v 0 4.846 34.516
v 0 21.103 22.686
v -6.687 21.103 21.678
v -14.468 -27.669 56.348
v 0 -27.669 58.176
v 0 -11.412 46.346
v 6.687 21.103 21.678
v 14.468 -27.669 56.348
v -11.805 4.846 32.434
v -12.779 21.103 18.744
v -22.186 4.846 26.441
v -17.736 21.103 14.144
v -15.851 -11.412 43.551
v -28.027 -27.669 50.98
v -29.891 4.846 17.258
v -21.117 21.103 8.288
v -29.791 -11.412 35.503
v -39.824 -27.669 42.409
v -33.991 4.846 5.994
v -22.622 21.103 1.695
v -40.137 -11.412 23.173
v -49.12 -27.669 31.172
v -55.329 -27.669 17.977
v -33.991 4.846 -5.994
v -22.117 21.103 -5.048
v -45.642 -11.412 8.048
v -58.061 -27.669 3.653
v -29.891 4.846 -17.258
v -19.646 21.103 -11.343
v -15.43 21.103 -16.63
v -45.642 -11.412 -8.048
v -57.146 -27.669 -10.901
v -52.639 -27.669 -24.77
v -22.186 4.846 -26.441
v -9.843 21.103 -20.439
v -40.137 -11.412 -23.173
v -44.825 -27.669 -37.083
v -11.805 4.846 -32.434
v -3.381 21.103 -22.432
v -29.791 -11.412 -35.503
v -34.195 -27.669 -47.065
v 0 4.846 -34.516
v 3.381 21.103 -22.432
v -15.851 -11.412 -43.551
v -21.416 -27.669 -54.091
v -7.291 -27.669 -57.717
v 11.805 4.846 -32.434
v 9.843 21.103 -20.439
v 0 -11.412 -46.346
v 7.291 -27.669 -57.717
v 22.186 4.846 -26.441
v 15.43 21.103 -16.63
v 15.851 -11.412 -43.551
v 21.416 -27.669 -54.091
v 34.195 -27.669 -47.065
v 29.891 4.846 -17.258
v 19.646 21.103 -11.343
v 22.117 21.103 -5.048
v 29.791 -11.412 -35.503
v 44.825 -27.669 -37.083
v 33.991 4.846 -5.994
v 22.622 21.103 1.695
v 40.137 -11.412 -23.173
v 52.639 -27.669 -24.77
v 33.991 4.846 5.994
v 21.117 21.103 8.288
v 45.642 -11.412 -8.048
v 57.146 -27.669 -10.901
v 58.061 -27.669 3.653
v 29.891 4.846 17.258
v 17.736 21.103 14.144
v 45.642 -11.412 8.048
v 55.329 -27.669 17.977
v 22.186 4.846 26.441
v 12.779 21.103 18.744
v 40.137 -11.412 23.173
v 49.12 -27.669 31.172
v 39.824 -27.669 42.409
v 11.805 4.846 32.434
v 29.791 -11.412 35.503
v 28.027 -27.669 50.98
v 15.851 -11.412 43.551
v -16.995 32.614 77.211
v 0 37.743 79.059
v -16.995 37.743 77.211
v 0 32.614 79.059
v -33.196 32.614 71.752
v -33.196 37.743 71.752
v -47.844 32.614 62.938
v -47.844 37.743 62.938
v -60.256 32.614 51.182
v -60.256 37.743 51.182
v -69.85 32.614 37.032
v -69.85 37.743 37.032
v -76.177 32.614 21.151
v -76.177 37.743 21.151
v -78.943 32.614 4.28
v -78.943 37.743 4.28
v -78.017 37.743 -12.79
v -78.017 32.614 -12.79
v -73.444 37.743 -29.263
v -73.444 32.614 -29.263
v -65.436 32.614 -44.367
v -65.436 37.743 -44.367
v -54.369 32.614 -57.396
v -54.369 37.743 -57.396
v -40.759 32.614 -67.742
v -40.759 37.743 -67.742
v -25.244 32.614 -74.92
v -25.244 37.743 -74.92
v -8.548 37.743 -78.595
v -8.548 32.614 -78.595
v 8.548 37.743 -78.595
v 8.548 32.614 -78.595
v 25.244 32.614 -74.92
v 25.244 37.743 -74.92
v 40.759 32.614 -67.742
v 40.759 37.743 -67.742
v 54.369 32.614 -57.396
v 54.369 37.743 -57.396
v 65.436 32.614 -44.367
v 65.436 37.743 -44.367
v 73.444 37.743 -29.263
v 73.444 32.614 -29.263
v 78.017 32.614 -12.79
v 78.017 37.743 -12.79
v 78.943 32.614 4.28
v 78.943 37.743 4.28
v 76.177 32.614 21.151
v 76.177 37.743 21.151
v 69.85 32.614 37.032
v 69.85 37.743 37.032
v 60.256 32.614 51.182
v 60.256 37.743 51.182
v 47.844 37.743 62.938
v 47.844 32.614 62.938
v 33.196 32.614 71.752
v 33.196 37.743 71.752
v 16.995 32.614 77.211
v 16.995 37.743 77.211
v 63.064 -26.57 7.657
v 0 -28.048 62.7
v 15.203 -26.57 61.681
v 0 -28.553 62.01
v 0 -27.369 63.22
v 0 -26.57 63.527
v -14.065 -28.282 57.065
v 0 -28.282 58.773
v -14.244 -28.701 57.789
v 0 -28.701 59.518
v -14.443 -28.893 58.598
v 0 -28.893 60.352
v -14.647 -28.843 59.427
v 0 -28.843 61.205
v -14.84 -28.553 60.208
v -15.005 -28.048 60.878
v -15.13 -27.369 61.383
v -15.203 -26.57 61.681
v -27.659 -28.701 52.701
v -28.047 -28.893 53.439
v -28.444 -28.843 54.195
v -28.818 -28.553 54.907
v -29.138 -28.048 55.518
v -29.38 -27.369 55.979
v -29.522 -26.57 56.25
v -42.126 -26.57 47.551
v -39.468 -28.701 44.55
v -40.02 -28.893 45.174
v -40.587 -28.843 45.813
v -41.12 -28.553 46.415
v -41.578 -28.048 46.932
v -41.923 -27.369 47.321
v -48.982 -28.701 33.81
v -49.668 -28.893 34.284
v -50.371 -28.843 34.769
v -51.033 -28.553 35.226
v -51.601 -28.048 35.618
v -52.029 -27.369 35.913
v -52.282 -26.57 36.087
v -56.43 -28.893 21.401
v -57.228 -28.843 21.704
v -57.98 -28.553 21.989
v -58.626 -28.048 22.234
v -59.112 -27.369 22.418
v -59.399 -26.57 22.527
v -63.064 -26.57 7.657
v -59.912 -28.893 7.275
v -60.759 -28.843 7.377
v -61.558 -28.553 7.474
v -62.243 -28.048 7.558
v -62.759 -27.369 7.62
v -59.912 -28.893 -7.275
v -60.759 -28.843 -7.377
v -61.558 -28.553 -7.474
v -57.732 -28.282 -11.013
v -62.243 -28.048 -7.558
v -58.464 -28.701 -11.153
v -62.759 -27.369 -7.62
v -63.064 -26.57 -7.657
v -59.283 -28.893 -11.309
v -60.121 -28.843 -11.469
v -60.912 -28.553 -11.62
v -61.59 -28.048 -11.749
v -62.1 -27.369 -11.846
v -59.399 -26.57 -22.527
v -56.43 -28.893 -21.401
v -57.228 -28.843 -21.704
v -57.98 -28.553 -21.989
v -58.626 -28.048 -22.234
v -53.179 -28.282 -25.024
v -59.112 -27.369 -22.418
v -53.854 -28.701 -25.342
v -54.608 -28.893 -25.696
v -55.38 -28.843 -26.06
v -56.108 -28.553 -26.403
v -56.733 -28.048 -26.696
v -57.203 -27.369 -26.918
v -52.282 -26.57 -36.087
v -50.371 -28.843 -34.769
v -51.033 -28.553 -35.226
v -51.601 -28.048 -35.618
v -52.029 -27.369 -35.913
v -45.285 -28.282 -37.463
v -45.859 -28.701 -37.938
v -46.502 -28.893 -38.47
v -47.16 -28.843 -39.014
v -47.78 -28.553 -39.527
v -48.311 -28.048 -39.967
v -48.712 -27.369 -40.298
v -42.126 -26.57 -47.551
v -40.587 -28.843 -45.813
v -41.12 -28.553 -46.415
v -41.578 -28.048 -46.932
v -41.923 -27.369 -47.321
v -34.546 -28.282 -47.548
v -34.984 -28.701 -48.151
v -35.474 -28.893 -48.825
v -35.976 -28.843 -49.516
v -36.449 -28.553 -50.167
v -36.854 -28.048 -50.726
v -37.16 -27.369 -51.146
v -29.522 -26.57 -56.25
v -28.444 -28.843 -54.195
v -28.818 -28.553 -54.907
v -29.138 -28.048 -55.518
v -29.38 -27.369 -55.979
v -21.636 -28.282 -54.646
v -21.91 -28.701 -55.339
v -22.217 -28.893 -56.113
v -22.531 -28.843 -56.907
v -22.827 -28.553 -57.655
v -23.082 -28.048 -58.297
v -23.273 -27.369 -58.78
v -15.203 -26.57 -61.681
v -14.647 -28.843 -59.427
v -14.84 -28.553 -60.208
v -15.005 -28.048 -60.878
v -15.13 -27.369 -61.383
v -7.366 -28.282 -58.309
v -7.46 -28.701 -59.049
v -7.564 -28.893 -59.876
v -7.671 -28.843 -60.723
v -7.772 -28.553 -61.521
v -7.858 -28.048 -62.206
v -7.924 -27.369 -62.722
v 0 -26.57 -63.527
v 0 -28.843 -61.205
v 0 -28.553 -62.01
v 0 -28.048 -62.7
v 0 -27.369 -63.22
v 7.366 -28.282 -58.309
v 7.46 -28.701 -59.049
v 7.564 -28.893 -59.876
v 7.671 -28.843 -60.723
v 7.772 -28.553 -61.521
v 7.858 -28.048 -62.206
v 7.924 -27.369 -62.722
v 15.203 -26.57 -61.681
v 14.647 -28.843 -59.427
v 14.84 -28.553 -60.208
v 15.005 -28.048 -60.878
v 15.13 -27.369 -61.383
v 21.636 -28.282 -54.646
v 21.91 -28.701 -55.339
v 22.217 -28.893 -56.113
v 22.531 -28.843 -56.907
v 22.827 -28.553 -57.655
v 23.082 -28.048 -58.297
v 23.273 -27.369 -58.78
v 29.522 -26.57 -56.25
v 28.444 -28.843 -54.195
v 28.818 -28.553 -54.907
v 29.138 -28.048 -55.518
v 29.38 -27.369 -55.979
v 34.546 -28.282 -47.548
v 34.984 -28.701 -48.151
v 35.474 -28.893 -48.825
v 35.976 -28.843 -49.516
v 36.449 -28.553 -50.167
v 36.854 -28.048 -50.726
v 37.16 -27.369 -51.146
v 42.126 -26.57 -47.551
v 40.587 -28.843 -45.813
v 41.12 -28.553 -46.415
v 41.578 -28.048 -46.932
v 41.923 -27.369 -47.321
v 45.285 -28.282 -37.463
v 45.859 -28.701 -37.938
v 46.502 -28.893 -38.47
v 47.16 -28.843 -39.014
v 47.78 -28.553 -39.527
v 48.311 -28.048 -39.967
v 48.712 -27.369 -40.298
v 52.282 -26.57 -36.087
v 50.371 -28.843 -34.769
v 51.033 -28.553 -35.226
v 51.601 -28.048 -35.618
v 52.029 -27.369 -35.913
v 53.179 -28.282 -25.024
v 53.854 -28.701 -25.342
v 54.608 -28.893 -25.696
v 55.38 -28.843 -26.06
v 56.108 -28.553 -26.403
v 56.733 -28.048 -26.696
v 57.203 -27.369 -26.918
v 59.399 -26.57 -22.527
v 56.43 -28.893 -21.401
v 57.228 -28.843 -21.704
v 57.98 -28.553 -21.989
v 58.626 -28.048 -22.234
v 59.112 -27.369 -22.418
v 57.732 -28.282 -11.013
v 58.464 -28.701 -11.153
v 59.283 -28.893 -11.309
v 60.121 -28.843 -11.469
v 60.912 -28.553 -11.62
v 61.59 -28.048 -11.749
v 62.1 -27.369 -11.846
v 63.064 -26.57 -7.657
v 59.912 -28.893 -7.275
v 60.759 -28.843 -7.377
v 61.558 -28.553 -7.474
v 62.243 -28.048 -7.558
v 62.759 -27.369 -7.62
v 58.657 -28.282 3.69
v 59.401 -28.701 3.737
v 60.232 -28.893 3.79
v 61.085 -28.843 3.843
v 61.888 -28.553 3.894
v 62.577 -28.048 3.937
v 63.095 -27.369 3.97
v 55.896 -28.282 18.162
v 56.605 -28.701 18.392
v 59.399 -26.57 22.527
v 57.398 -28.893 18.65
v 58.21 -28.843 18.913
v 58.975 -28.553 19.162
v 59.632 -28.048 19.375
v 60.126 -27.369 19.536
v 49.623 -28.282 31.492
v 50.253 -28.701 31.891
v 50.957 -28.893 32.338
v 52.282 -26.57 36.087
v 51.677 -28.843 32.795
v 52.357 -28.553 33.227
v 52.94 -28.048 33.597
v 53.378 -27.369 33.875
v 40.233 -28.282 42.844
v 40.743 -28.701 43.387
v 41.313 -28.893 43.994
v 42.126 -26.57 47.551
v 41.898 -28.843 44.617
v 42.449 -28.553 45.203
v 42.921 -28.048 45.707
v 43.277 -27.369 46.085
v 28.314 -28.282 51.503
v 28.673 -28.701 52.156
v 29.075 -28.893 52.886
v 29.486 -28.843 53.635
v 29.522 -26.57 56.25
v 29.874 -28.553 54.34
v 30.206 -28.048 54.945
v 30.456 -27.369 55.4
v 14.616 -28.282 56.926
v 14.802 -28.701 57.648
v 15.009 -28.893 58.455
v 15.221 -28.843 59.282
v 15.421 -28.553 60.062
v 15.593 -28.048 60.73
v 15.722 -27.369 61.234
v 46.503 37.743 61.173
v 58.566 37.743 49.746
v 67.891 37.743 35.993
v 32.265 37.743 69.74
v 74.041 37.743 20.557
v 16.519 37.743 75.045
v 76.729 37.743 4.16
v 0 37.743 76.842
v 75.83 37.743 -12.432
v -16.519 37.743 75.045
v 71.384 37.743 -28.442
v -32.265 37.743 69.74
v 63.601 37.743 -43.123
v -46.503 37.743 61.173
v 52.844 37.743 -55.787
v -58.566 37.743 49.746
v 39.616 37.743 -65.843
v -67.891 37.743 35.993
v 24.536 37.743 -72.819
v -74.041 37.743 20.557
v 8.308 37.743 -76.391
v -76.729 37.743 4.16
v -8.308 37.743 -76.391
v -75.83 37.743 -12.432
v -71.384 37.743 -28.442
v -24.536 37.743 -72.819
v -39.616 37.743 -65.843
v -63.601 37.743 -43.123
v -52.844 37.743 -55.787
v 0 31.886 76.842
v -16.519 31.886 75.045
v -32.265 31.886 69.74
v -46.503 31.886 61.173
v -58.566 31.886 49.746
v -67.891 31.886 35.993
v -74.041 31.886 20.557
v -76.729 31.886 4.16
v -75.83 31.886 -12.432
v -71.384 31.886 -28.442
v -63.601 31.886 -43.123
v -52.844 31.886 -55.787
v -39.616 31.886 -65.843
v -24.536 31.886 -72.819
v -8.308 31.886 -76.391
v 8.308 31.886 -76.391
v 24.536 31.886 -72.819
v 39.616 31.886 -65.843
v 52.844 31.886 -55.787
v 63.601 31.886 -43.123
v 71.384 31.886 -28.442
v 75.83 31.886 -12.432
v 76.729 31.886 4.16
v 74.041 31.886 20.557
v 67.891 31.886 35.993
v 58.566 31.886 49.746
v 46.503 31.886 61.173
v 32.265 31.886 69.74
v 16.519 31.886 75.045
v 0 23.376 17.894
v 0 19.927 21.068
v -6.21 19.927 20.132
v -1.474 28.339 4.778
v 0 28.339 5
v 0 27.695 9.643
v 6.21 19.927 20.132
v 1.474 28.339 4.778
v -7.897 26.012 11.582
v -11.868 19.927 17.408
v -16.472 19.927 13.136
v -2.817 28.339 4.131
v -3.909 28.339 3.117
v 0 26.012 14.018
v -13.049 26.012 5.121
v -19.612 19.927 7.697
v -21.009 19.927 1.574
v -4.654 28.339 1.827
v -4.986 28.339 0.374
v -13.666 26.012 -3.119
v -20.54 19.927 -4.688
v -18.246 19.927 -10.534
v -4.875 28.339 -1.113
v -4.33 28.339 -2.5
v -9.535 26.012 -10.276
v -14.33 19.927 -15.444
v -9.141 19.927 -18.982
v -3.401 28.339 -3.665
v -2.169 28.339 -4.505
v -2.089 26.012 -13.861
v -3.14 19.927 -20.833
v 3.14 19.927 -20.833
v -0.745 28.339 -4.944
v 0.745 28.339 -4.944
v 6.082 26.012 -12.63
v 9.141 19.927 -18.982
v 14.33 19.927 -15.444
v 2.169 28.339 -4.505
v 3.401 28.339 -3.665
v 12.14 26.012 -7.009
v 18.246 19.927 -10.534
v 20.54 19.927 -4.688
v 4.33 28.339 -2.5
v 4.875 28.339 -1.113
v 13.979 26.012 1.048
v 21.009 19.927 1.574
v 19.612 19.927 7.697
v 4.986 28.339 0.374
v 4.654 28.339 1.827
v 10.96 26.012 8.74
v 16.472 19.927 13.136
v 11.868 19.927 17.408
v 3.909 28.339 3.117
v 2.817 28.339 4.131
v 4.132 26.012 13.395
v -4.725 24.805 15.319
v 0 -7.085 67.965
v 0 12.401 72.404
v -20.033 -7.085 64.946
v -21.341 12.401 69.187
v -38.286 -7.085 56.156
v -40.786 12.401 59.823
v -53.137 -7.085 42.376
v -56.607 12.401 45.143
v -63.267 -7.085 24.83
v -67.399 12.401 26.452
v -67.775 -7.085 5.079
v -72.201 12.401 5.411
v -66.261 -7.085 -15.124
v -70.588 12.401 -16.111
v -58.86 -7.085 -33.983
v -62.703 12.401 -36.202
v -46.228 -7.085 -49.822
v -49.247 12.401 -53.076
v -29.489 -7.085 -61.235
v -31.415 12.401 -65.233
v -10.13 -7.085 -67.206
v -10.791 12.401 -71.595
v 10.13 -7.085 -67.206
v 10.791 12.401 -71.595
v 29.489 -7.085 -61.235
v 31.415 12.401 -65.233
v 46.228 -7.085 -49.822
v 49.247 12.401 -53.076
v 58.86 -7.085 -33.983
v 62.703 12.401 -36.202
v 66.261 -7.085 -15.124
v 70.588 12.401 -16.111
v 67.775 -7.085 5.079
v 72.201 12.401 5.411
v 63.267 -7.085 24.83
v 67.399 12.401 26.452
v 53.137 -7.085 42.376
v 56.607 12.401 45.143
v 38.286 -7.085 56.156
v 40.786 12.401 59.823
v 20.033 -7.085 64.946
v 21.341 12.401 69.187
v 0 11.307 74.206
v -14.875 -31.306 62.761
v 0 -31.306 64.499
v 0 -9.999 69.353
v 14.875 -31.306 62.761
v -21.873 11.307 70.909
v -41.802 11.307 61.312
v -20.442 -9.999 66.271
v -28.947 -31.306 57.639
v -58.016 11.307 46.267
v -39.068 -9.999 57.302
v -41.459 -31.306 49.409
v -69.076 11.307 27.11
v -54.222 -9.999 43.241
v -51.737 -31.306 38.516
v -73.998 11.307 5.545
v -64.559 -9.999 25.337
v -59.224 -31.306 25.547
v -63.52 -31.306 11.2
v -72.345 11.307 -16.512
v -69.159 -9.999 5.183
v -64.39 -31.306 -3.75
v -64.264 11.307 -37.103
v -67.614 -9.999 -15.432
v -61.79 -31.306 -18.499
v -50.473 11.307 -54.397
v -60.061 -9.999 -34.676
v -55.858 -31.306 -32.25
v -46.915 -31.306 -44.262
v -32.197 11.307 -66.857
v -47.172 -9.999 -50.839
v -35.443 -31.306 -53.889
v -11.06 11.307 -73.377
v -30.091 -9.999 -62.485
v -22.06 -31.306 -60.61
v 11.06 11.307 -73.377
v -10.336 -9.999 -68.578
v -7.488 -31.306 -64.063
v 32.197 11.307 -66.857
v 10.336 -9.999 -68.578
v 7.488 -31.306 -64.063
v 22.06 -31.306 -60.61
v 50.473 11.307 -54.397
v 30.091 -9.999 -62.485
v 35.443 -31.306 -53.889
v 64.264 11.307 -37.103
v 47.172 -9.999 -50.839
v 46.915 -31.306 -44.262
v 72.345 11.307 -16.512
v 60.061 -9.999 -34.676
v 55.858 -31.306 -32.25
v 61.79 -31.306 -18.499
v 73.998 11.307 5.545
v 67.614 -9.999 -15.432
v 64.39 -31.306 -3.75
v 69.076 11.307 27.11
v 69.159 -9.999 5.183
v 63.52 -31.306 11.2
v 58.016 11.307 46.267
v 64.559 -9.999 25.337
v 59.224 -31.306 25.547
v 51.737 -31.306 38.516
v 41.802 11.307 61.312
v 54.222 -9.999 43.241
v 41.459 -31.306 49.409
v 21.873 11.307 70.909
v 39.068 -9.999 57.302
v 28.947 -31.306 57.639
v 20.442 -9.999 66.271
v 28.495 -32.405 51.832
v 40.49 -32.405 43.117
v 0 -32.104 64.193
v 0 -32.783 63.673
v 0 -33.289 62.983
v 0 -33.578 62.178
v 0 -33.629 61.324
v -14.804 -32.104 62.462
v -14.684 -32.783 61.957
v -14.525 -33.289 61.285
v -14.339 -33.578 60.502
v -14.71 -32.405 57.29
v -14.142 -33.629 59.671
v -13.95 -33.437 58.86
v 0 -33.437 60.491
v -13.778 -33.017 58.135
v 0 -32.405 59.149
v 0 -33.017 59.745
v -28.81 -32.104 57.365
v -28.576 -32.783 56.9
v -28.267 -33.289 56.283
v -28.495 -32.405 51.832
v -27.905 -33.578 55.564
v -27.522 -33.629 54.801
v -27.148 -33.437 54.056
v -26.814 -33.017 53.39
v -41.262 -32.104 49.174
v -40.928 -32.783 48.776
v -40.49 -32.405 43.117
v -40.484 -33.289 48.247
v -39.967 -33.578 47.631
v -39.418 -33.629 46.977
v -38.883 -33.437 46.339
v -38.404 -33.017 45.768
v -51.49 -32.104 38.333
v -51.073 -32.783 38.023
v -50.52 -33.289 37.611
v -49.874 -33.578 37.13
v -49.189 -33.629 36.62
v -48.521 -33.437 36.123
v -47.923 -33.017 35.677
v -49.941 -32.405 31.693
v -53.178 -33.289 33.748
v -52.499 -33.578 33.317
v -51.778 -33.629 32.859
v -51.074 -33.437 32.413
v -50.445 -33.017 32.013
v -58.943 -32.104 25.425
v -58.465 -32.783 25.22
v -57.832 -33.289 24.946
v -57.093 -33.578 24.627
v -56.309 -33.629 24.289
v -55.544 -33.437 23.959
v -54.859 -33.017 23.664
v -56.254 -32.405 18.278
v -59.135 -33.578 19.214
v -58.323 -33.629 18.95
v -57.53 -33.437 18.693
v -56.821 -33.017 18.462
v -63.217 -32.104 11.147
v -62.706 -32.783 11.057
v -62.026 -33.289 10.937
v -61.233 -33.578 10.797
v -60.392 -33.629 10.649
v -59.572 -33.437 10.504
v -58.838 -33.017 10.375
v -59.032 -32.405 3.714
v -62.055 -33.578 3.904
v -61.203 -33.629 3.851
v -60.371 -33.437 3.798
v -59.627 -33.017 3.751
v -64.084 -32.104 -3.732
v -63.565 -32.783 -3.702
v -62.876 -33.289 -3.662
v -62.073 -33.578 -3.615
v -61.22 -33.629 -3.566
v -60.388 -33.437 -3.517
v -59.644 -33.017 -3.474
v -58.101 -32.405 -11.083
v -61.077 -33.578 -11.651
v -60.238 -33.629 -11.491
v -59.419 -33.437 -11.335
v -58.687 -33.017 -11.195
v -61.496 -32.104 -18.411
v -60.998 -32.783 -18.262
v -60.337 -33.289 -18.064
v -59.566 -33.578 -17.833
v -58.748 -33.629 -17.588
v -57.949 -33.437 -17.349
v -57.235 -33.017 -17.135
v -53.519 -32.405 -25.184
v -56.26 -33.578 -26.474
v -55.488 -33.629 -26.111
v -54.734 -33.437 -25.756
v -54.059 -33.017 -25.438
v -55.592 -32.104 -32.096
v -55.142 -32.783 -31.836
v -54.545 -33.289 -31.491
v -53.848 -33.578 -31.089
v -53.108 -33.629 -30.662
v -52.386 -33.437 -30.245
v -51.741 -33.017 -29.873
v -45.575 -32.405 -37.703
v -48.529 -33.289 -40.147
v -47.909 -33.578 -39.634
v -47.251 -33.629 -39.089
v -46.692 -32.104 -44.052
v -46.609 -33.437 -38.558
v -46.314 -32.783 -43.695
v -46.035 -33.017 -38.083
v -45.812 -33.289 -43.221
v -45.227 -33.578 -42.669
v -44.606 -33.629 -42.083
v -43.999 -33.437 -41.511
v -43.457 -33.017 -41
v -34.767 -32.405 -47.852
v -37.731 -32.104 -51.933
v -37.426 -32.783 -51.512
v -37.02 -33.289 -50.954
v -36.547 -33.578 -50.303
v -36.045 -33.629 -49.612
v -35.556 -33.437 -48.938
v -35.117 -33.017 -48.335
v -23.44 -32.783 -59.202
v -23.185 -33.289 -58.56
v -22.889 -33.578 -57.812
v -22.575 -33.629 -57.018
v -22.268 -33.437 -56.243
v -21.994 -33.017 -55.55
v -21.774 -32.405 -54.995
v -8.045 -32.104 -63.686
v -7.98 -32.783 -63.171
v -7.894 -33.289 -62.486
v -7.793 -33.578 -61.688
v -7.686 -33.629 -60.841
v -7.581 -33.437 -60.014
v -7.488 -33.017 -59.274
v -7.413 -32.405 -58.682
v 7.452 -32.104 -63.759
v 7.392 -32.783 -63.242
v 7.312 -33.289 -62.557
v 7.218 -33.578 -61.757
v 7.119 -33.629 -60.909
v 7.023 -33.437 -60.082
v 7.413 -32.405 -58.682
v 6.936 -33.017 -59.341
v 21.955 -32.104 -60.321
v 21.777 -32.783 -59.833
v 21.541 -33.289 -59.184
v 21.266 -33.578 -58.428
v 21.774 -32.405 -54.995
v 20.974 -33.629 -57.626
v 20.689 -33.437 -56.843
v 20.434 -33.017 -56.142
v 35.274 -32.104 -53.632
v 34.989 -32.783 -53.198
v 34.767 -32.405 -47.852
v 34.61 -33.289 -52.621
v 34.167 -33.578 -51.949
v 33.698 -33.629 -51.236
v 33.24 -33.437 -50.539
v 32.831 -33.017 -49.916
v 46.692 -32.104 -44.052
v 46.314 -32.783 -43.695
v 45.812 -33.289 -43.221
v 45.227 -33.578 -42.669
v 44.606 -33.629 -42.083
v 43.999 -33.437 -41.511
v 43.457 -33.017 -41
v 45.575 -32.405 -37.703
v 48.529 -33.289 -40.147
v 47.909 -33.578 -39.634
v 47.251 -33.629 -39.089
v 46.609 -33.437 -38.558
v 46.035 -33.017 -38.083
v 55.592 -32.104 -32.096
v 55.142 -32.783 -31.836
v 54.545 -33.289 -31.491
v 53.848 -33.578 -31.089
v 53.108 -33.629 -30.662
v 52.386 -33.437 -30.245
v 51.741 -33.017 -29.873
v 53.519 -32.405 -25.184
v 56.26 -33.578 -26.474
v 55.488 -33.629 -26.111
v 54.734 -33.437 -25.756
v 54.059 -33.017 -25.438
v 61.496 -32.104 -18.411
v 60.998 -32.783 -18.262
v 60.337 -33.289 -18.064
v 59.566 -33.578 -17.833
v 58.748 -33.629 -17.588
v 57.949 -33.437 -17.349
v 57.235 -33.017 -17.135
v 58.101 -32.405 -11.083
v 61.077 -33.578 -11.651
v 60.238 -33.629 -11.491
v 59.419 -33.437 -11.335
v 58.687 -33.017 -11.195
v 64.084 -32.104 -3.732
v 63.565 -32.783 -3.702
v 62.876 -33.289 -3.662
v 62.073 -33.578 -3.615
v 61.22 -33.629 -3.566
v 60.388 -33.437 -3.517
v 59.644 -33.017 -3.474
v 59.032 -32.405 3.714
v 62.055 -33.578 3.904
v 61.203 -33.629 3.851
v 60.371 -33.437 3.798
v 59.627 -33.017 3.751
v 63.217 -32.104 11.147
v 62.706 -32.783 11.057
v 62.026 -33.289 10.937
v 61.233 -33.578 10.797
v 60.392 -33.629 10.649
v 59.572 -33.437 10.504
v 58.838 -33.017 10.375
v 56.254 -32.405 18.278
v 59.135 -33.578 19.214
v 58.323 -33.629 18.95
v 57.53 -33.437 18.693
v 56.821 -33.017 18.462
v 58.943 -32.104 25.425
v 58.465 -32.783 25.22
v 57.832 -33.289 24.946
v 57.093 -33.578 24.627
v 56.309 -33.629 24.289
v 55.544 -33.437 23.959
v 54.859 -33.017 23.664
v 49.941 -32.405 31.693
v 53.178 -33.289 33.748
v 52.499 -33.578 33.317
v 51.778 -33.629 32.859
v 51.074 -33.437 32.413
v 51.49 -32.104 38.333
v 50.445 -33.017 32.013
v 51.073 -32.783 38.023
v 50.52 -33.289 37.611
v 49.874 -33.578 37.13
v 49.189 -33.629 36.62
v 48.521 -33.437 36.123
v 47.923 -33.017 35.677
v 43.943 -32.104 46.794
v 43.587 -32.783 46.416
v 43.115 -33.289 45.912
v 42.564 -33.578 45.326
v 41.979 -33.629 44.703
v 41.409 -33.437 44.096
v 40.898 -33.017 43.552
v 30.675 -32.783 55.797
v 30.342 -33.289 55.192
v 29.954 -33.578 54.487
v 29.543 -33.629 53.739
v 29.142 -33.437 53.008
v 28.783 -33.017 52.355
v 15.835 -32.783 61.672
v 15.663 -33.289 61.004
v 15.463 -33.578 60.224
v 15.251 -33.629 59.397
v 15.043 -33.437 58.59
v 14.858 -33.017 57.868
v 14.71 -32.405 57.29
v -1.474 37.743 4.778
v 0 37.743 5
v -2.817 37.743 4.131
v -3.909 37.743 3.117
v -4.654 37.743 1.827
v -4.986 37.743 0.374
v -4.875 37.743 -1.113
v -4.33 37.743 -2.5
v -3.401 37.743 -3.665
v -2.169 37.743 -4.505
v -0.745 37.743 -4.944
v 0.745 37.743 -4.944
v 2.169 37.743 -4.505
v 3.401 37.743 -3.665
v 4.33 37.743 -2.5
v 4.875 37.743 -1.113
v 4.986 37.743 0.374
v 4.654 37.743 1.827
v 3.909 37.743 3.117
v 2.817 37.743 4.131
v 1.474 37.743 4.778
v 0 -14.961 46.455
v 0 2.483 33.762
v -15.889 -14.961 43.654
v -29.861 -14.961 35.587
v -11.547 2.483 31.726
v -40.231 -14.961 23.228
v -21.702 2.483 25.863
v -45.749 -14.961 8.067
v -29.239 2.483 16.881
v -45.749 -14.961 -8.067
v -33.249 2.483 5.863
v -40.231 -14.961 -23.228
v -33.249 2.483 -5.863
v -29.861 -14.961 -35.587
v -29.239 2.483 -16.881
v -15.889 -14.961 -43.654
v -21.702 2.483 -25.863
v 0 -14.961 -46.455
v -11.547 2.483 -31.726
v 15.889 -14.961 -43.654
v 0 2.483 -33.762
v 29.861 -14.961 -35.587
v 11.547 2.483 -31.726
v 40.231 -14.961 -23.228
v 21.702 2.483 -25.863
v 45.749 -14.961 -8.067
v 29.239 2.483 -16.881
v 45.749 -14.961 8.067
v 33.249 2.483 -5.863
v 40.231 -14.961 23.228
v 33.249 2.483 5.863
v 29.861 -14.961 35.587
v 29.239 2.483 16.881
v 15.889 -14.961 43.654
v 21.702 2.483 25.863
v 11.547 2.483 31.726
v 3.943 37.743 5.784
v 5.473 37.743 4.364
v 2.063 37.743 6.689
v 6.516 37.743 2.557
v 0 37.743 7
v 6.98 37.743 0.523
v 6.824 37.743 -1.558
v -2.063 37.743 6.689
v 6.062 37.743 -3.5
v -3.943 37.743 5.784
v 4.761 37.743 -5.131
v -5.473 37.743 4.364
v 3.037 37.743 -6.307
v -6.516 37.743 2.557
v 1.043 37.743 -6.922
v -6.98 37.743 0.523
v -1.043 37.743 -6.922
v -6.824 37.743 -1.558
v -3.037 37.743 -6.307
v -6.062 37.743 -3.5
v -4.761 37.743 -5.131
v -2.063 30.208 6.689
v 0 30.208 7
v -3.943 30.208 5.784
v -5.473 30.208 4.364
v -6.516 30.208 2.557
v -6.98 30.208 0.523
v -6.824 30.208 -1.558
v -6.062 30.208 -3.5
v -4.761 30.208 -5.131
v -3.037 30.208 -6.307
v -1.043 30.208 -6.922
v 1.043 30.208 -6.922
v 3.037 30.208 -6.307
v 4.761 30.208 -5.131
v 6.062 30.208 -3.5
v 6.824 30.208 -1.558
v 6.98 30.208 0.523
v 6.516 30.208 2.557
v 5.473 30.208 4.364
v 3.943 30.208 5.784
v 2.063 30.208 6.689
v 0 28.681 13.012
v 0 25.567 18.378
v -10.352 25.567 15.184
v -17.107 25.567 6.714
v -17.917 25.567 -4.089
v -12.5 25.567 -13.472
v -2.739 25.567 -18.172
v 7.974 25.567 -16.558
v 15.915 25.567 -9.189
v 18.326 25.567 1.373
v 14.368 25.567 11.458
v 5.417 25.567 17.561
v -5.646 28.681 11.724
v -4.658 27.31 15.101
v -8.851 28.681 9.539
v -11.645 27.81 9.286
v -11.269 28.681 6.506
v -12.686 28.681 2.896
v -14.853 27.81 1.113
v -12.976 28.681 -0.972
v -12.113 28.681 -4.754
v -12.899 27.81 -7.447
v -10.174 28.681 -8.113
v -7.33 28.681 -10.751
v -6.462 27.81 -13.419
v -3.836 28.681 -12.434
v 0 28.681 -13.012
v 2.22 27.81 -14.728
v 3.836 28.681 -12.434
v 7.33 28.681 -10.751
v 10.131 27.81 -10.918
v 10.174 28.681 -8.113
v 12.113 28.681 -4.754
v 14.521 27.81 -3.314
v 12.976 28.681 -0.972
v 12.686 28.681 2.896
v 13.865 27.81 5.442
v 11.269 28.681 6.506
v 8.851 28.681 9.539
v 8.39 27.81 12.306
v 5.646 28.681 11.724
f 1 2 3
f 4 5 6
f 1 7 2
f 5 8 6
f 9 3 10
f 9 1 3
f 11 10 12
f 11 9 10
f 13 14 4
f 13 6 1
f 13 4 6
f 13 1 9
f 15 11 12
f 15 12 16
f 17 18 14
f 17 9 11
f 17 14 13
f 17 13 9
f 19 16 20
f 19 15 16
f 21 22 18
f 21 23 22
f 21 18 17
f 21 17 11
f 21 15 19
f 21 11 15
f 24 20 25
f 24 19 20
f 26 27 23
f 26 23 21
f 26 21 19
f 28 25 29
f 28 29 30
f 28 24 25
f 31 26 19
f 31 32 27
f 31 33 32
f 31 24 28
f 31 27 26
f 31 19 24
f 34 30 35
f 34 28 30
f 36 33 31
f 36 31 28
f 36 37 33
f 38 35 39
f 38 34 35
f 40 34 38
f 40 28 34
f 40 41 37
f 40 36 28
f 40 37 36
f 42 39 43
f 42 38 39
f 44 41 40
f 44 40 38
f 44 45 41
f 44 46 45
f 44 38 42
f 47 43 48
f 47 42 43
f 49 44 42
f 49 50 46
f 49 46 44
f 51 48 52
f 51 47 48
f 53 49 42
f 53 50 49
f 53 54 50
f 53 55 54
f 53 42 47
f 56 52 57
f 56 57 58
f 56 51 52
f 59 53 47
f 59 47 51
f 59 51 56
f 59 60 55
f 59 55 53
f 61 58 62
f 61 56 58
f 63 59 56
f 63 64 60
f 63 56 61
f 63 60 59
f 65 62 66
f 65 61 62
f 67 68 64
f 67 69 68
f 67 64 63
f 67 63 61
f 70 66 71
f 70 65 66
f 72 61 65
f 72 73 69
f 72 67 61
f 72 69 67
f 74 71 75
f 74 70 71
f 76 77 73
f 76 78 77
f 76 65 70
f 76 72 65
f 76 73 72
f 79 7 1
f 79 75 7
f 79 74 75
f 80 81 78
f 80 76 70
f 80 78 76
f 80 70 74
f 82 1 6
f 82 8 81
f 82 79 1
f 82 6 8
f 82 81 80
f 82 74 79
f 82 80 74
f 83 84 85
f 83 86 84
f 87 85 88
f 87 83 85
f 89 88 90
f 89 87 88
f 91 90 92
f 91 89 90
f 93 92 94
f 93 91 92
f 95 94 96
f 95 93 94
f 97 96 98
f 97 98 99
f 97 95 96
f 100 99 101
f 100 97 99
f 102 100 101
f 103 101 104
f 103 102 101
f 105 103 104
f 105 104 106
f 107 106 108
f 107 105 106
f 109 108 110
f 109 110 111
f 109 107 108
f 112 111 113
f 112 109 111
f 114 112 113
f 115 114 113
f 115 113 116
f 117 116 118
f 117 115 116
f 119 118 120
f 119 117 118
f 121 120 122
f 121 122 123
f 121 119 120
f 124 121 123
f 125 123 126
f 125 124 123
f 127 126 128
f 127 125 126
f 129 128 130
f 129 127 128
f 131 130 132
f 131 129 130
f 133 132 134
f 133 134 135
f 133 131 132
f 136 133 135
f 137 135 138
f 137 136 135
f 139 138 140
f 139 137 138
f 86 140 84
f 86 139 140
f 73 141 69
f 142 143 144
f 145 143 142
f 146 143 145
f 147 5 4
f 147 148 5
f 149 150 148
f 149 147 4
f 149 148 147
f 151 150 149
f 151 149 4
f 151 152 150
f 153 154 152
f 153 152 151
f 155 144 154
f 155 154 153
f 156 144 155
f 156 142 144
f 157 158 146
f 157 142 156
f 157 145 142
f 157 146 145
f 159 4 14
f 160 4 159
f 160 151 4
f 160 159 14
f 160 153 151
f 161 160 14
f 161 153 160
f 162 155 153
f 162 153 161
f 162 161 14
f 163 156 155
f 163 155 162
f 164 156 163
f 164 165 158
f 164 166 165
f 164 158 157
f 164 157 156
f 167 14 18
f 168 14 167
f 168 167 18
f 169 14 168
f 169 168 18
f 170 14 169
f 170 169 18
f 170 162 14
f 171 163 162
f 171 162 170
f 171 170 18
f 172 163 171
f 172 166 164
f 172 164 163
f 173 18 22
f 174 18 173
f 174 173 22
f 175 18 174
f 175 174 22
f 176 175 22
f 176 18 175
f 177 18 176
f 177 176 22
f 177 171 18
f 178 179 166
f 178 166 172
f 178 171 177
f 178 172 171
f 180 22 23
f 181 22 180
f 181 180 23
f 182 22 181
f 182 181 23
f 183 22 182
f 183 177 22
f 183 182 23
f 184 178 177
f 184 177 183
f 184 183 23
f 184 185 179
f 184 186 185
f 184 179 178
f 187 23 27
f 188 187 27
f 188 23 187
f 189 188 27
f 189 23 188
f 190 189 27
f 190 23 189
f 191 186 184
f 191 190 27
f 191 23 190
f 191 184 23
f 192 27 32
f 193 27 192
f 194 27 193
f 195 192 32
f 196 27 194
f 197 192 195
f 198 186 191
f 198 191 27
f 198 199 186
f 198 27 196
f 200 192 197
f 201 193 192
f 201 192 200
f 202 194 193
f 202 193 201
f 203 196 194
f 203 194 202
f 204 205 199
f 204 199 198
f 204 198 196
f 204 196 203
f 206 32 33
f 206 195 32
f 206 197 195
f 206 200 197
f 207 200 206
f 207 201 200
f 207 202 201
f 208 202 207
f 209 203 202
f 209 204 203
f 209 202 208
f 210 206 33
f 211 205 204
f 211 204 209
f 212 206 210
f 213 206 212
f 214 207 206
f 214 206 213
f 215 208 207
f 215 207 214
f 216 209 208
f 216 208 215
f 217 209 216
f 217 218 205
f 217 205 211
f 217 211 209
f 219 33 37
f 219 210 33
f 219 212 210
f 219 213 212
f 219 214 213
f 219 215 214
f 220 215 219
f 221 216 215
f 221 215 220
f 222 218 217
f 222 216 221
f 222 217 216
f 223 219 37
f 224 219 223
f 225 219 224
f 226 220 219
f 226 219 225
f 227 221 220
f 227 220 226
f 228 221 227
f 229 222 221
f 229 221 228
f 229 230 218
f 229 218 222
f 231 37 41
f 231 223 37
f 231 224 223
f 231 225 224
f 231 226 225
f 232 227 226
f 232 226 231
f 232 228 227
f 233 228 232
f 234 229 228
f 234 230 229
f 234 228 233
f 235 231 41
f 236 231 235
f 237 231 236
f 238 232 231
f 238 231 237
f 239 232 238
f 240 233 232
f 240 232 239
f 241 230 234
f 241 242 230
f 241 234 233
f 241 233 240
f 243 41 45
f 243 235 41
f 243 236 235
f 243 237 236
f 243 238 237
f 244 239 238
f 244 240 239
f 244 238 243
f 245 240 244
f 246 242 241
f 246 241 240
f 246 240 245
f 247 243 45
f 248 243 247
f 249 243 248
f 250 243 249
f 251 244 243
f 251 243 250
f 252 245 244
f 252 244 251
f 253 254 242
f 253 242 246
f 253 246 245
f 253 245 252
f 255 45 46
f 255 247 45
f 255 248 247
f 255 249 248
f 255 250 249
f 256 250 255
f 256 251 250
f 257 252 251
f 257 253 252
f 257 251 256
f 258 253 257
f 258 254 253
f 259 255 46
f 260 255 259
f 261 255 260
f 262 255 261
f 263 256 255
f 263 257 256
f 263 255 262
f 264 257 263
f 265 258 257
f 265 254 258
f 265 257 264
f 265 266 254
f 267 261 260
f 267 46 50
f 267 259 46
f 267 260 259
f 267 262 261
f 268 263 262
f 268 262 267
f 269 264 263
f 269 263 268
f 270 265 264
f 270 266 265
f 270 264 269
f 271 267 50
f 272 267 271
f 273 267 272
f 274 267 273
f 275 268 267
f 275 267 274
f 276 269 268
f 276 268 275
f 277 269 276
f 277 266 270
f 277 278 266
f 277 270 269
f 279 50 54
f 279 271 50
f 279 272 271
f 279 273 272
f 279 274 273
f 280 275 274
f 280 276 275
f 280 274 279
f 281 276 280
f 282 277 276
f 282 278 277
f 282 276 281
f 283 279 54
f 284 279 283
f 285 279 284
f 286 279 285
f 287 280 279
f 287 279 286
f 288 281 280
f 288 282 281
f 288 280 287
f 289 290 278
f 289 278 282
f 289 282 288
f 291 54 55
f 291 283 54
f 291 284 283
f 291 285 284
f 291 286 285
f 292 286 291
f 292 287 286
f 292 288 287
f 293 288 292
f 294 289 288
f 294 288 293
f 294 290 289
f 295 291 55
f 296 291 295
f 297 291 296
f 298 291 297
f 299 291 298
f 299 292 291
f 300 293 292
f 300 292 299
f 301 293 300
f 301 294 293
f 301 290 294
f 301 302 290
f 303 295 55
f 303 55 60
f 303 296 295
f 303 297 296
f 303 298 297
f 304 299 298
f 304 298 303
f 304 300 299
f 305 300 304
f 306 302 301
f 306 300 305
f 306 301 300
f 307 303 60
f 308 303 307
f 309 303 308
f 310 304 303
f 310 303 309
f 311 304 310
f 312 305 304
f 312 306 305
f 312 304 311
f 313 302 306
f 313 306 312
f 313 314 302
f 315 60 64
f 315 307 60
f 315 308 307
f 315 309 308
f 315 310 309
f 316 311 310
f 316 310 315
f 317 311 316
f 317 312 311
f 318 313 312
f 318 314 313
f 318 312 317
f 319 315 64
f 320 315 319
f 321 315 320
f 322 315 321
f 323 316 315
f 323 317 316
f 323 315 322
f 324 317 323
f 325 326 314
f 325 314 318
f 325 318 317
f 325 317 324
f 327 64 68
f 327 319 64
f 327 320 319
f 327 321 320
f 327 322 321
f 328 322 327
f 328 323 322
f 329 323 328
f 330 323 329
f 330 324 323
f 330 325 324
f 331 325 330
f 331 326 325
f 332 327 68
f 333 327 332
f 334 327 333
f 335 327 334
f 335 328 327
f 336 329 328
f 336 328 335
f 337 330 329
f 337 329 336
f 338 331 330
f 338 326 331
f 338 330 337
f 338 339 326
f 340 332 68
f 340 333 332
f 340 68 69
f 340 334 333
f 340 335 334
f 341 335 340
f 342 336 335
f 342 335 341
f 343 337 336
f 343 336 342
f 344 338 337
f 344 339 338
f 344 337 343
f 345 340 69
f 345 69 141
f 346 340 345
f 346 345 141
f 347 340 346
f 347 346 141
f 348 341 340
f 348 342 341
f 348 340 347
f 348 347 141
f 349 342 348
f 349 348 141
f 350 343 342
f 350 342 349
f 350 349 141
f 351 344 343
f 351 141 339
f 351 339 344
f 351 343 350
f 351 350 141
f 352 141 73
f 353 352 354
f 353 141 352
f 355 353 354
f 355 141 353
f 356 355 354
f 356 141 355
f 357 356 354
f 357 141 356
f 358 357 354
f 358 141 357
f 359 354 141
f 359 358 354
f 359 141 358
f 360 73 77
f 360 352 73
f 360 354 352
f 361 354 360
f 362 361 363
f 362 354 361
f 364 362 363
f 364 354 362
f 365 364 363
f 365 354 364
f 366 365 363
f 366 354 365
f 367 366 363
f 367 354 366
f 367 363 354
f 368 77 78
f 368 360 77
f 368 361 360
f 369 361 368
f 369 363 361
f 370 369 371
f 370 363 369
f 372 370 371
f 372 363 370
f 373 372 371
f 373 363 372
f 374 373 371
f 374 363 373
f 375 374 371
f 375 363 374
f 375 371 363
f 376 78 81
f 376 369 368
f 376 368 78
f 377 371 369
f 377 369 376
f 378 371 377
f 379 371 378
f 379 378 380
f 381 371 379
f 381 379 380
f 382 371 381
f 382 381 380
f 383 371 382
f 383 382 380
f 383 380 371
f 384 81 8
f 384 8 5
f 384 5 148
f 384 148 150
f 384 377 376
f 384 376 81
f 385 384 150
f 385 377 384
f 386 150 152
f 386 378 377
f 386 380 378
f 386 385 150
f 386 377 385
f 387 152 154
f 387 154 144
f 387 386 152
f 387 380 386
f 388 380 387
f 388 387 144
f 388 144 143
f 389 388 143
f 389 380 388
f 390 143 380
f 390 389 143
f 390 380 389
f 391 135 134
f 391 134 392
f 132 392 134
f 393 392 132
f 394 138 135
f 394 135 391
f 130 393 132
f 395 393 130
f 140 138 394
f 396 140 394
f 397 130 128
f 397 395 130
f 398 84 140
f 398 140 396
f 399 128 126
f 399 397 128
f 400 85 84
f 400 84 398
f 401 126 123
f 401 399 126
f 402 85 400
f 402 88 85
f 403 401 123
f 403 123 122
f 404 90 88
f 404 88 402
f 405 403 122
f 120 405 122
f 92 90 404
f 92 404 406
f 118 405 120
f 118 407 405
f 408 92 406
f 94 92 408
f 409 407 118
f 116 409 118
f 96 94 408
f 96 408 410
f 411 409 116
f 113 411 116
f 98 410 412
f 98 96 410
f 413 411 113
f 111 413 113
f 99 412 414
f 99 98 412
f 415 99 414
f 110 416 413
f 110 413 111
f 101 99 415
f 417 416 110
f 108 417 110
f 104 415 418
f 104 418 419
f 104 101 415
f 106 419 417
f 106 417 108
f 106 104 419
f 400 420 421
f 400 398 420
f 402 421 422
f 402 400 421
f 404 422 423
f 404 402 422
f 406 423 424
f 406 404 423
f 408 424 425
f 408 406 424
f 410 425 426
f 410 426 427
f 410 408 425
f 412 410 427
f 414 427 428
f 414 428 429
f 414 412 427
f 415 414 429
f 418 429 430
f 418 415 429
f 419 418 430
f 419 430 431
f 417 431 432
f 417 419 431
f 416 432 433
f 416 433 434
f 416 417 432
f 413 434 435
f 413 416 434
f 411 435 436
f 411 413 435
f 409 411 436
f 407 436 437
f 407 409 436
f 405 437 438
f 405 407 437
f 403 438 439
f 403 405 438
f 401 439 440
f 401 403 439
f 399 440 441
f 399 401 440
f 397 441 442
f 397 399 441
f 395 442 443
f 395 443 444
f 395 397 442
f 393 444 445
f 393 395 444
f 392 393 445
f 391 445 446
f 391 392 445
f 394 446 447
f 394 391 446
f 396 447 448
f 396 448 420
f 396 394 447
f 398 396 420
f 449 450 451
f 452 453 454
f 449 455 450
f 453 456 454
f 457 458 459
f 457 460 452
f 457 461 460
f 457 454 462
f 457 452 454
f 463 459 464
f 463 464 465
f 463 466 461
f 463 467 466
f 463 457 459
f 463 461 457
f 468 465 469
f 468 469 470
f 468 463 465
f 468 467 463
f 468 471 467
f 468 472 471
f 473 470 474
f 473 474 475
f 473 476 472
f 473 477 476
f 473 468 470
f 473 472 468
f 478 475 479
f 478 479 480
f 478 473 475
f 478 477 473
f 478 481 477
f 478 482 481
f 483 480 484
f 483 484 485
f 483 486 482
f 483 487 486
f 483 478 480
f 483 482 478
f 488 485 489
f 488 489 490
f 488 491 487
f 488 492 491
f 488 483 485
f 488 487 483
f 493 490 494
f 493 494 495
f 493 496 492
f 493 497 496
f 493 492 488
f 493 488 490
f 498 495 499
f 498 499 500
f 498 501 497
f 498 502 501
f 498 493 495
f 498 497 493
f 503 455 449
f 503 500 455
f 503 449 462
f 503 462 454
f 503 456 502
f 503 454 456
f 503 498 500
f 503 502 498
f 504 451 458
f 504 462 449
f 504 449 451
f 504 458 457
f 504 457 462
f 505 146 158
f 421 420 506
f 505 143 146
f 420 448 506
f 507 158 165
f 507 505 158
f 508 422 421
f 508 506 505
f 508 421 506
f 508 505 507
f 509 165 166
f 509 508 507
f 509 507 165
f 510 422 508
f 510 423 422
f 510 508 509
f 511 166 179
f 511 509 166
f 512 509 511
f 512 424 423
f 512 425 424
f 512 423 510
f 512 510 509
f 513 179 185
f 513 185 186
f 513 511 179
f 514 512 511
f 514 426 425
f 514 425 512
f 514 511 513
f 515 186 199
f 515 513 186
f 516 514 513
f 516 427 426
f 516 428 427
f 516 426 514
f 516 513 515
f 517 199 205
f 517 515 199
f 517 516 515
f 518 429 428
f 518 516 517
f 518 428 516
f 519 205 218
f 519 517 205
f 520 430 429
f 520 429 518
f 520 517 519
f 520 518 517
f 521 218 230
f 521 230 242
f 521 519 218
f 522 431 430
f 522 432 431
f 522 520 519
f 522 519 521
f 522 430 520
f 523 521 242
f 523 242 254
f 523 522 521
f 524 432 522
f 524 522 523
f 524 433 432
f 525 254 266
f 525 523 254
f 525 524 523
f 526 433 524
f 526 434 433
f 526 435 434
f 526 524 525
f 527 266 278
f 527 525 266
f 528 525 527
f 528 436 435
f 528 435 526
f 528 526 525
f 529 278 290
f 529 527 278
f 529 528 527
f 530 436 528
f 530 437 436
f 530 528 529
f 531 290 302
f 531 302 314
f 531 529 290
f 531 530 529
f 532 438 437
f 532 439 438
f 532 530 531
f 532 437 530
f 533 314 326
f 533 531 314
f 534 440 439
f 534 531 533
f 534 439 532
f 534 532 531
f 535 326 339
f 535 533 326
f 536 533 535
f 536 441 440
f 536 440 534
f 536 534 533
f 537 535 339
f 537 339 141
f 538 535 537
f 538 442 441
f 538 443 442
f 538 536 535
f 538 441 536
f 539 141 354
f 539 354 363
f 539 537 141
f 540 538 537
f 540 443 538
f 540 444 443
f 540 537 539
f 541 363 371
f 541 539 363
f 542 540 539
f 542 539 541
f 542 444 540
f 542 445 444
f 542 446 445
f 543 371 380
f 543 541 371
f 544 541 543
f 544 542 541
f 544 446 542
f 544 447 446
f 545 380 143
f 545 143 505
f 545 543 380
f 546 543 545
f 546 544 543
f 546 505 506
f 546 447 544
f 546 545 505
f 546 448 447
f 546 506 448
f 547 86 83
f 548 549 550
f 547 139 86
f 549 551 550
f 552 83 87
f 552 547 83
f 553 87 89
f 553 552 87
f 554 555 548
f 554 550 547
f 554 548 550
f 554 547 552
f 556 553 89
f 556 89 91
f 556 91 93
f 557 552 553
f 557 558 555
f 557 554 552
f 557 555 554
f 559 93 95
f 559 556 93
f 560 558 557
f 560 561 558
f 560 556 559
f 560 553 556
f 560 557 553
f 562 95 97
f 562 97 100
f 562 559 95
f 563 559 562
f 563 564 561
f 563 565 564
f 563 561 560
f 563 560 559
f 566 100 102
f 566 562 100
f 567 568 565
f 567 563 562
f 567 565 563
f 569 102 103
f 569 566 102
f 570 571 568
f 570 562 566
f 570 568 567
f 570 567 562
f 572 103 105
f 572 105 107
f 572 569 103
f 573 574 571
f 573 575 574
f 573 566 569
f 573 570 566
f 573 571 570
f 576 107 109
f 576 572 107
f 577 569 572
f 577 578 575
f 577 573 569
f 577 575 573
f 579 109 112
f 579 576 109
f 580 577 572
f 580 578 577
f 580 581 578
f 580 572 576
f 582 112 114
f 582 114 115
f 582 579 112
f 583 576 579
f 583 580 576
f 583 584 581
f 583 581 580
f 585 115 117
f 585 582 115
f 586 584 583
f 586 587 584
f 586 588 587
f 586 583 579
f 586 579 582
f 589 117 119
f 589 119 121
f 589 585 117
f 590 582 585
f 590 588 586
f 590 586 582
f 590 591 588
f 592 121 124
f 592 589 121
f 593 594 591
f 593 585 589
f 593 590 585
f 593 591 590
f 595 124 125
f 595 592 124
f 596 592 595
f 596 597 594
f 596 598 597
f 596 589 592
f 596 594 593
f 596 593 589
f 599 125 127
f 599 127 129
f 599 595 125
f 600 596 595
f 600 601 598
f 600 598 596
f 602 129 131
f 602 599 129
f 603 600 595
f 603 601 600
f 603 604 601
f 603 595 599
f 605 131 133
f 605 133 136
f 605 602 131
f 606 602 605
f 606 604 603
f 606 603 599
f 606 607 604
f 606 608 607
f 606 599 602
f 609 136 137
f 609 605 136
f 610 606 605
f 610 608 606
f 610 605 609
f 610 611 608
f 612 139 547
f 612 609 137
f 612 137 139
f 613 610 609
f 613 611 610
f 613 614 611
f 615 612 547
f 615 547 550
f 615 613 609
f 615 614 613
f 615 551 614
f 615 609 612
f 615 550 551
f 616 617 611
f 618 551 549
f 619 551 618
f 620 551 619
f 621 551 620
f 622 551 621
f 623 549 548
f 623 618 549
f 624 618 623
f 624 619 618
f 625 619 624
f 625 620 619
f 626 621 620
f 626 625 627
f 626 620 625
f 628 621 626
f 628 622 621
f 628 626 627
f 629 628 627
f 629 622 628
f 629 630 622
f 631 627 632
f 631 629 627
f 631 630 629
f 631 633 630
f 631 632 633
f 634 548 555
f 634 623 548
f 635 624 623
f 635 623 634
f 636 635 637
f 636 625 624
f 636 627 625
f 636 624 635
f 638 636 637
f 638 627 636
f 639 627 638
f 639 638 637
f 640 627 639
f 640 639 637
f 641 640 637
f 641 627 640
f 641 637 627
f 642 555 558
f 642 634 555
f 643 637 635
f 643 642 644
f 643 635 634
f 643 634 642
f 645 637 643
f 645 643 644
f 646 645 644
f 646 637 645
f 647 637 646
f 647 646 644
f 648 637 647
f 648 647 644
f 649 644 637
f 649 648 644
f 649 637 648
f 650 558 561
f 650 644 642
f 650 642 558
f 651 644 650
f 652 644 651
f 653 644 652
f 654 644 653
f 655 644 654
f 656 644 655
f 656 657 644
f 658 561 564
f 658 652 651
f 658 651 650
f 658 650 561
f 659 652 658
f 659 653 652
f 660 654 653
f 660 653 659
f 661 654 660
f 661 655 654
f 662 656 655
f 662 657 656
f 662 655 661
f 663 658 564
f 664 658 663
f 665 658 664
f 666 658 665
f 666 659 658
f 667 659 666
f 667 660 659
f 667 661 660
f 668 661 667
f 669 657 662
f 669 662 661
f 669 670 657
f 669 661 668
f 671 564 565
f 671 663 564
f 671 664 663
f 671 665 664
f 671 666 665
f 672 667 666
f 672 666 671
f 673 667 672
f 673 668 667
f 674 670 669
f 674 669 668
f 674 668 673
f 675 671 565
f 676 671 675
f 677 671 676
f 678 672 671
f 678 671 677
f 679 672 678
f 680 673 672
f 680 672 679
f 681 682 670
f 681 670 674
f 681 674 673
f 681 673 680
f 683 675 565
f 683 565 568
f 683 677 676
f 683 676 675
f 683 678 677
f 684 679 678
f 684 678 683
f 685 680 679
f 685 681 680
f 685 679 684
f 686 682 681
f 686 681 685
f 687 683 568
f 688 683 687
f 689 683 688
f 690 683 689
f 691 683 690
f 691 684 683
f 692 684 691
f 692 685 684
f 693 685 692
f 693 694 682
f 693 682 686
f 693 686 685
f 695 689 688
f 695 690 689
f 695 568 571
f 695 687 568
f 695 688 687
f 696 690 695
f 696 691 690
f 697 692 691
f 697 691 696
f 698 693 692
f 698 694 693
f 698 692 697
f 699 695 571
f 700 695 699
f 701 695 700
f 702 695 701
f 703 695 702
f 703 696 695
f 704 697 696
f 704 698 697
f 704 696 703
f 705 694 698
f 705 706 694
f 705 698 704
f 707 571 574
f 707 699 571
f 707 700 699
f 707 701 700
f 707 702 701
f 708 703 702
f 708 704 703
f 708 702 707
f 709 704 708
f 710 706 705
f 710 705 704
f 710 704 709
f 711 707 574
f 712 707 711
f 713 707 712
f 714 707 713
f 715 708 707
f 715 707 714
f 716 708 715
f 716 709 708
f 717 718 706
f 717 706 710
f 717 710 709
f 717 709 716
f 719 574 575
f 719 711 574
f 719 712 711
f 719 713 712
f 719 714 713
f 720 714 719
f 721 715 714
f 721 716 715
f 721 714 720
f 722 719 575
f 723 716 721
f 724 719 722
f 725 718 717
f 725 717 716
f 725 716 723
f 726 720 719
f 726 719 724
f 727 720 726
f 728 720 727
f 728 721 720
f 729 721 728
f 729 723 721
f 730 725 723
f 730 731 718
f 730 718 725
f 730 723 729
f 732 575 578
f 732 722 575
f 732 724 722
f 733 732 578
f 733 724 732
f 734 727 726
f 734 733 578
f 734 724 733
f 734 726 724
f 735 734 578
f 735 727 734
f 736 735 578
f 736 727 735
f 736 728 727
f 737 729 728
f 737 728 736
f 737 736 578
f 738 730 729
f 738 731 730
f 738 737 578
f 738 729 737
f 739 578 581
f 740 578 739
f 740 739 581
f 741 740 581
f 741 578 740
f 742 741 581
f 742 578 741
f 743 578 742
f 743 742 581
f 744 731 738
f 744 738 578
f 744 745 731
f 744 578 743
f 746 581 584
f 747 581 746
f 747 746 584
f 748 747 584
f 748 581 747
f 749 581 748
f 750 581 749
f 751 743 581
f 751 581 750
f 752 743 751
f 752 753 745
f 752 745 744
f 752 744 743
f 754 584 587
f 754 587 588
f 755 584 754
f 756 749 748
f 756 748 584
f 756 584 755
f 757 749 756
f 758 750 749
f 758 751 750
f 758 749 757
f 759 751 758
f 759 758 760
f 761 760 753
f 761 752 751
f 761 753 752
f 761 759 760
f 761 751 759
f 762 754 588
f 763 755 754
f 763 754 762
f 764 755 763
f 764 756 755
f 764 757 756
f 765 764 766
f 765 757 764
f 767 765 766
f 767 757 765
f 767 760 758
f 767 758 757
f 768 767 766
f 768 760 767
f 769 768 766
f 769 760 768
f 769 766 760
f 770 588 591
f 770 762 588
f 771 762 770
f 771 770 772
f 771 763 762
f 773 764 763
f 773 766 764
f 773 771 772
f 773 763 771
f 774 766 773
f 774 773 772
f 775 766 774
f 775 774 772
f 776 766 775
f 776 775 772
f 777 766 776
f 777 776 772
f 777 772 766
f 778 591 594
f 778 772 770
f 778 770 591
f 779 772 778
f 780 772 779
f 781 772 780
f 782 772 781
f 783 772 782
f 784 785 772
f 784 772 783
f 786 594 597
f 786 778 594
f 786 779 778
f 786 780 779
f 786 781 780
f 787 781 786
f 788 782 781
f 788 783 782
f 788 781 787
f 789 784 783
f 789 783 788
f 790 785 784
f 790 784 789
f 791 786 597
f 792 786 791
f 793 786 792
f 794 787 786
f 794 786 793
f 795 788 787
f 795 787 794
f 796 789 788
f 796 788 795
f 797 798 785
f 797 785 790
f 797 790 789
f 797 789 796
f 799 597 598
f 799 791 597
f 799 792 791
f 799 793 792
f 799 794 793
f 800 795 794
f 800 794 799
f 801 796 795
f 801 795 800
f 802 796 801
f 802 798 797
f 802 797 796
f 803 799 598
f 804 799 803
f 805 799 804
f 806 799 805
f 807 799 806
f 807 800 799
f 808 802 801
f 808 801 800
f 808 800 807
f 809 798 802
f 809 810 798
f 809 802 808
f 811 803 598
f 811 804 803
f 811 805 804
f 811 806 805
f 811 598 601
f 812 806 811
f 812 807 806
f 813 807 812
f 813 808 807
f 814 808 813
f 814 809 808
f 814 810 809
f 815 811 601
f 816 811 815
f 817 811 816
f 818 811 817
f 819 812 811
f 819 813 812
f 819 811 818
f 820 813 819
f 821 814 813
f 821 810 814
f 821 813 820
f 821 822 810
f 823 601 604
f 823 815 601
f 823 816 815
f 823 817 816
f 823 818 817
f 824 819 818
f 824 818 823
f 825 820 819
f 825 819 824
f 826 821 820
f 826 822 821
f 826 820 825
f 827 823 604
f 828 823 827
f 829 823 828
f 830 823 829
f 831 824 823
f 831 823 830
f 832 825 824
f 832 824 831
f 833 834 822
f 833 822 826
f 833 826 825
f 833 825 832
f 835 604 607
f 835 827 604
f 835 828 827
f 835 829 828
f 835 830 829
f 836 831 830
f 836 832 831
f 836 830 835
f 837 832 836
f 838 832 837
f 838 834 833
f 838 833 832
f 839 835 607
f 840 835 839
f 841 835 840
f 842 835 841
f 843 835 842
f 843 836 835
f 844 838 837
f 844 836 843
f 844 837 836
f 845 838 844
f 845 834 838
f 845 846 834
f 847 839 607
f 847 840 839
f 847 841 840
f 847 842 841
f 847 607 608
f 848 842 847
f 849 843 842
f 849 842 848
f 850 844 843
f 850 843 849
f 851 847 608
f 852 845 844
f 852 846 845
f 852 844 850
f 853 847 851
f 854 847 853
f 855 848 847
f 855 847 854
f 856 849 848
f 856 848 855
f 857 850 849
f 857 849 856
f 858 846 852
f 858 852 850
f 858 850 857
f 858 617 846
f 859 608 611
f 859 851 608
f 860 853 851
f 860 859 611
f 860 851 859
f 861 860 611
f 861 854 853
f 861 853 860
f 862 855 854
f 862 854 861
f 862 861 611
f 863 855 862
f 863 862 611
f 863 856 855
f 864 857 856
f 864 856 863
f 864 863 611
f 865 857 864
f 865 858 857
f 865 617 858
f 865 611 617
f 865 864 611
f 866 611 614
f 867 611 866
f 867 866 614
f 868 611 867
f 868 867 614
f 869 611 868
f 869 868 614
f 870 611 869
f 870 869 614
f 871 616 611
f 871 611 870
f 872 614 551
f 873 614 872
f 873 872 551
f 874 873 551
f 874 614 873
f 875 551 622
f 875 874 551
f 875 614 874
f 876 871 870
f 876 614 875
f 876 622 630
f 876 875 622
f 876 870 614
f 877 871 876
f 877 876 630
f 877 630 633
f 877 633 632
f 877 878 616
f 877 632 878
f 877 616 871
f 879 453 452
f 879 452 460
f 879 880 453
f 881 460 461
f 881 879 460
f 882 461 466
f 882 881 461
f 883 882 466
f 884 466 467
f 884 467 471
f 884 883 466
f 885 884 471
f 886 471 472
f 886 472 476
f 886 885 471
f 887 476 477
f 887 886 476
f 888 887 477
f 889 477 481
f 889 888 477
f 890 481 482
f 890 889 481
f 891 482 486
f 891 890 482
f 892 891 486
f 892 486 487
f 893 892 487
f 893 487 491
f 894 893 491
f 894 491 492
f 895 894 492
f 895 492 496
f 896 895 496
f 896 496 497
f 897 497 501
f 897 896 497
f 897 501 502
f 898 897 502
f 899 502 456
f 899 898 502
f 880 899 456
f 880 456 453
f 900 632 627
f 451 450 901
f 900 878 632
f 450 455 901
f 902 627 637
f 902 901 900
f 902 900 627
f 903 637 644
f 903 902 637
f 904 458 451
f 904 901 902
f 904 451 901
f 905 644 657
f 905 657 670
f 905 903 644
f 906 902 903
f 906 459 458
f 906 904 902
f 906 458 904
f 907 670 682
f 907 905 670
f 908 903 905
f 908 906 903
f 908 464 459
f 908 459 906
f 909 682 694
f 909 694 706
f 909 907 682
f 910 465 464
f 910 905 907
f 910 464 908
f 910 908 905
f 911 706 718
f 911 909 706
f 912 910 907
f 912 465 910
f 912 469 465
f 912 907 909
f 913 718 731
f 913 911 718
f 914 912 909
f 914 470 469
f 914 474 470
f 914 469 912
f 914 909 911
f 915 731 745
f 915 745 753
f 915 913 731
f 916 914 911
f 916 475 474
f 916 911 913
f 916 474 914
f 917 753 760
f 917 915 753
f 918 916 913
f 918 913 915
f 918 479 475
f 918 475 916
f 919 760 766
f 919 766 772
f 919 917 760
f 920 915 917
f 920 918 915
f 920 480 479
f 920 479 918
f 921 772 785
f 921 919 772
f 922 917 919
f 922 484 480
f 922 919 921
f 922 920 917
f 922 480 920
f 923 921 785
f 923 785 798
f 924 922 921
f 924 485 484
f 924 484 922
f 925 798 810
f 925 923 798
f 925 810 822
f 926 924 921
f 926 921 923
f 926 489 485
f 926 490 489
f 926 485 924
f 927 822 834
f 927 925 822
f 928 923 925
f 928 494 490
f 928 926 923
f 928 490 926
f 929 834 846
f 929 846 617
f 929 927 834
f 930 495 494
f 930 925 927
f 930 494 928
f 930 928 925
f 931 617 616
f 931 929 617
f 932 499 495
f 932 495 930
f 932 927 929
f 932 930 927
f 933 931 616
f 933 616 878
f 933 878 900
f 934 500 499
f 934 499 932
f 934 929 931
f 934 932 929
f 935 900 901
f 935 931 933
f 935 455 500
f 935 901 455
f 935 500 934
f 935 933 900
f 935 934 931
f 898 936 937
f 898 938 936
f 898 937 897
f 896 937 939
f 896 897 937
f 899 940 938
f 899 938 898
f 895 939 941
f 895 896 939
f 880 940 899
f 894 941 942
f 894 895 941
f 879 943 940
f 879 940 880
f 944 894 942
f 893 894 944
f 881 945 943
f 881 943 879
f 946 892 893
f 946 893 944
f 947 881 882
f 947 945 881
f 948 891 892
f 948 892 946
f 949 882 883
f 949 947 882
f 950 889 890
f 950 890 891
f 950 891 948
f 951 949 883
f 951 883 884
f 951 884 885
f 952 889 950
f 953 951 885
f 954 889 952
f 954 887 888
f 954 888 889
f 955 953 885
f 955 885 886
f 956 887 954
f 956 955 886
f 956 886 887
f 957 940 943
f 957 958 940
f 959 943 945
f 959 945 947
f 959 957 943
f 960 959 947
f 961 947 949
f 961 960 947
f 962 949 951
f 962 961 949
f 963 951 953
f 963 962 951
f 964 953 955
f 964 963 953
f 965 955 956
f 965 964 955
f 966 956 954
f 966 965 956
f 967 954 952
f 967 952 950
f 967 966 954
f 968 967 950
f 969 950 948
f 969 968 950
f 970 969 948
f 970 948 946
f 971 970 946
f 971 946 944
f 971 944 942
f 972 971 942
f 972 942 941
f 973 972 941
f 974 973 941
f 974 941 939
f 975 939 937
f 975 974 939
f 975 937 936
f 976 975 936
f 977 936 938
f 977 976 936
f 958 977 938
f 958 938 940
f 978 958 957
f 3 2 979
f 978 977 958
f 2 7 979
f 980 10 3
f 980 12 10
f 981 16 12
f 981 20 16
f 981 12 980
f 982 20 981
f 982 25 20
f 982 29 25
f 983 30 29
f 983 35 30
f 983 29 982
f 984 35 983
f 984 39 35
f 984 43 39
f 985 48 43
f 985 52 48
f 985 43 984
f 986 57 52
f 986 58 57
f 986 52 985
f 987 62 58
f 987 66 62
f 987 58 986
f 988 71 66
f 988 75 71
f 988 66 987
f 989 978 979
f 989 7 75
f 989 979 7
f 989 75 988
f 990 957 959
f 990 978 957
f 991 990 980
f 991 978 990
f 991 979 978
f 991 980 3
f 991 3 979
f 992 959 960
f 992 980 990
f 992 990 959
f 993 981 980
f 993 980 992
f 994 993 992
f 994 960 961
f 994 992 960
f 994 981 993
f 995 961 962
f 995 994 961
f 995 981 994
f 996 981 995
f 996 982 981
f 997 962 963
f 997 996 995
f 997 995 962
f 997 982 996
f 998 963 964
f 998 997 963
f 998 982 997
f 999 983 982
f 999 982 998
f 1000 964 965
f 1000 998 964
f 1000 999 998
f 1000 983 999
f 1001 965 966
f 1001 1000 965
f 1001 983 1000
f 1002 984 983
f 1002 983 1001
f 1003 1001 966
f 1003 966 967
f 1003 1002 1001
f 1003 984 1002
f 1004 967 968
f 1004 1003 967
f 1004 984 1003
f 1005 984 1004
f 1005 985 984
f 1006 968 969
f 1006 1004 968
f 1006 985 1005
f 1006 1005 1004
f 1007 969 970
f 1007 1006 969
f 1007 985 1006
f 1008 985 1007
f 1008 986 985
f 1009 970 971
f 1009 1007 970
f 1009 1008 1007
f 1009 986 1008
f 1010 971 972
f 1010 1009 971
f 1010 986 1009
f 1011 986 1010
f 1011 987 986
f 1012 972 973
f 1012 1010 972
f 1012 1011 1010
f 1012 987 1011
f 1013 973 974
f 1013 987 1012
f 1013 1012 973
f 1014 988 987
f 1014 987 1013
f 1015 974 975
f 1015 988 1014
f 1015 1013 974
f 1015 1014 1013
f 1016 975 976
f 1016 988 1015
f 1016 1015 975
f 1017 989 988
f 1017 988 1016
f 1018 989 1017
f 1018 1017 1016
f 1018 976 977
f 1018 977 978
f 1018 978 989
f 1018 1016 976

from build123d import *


with BuildPart() as part:
    # Sketch1 → Revolve7 (revolve)
    with BuildSketch(Plane(origin=(0, 0, 0), x_dir=(0, 0, -1), z_dir=(1, 0, 0))):
        with BuildLine():
            Line((-59.148631637, -32.404719831), (-21.068373541, 19.926718309))
            ThreePointArc((-21.068373541, 19.926718309), (-14.017788653, 26.011562826), (-5, 28.338700093))
            Line((-5, 28.338700093), (-5, 37.743055381))
            Line((-5, 37.743055381), (-7, 37.743055381))
            Line((-7, 37.743055381), (-7, 30.208100681))
            ThreePointArc((-7, 30.208100681), (-15.803114649, 27.310289813), (-22.685536518, 21.103486724))
            Line((-22.685536518, 21.103486724), (-58.176080505, -27.669061048))
            ThreePointArc((-58.176080505, -27.669061048), (-61.205332633, -28.842577937), (-63.526904277, -26.570174926))
            Line((-63.526904277, -26.570174926), (-76.841870349, 31.885910778))
            Line((-76.841870349, 31.885910778), (-76.841870349, 37.743055381))
            Line((-76.841870349, 37.743055381), (-79.058926618, 37.743055381))
            Line((-79.058926618, 37.743055381), (-79.058926618, 32.613945898))
            Line((-79.058926618, 32.613945898), (-64.499455409, -31.305833709))
            ThreePointArc((-64.499455409, -31.305833709), (-62.177883765, -33.578236719), (-59.148631637, -32.404719831))
        make_face()
    revolve(axis=Axis((0, 0, 0), (0, -1, 0)))


solid = part.part
